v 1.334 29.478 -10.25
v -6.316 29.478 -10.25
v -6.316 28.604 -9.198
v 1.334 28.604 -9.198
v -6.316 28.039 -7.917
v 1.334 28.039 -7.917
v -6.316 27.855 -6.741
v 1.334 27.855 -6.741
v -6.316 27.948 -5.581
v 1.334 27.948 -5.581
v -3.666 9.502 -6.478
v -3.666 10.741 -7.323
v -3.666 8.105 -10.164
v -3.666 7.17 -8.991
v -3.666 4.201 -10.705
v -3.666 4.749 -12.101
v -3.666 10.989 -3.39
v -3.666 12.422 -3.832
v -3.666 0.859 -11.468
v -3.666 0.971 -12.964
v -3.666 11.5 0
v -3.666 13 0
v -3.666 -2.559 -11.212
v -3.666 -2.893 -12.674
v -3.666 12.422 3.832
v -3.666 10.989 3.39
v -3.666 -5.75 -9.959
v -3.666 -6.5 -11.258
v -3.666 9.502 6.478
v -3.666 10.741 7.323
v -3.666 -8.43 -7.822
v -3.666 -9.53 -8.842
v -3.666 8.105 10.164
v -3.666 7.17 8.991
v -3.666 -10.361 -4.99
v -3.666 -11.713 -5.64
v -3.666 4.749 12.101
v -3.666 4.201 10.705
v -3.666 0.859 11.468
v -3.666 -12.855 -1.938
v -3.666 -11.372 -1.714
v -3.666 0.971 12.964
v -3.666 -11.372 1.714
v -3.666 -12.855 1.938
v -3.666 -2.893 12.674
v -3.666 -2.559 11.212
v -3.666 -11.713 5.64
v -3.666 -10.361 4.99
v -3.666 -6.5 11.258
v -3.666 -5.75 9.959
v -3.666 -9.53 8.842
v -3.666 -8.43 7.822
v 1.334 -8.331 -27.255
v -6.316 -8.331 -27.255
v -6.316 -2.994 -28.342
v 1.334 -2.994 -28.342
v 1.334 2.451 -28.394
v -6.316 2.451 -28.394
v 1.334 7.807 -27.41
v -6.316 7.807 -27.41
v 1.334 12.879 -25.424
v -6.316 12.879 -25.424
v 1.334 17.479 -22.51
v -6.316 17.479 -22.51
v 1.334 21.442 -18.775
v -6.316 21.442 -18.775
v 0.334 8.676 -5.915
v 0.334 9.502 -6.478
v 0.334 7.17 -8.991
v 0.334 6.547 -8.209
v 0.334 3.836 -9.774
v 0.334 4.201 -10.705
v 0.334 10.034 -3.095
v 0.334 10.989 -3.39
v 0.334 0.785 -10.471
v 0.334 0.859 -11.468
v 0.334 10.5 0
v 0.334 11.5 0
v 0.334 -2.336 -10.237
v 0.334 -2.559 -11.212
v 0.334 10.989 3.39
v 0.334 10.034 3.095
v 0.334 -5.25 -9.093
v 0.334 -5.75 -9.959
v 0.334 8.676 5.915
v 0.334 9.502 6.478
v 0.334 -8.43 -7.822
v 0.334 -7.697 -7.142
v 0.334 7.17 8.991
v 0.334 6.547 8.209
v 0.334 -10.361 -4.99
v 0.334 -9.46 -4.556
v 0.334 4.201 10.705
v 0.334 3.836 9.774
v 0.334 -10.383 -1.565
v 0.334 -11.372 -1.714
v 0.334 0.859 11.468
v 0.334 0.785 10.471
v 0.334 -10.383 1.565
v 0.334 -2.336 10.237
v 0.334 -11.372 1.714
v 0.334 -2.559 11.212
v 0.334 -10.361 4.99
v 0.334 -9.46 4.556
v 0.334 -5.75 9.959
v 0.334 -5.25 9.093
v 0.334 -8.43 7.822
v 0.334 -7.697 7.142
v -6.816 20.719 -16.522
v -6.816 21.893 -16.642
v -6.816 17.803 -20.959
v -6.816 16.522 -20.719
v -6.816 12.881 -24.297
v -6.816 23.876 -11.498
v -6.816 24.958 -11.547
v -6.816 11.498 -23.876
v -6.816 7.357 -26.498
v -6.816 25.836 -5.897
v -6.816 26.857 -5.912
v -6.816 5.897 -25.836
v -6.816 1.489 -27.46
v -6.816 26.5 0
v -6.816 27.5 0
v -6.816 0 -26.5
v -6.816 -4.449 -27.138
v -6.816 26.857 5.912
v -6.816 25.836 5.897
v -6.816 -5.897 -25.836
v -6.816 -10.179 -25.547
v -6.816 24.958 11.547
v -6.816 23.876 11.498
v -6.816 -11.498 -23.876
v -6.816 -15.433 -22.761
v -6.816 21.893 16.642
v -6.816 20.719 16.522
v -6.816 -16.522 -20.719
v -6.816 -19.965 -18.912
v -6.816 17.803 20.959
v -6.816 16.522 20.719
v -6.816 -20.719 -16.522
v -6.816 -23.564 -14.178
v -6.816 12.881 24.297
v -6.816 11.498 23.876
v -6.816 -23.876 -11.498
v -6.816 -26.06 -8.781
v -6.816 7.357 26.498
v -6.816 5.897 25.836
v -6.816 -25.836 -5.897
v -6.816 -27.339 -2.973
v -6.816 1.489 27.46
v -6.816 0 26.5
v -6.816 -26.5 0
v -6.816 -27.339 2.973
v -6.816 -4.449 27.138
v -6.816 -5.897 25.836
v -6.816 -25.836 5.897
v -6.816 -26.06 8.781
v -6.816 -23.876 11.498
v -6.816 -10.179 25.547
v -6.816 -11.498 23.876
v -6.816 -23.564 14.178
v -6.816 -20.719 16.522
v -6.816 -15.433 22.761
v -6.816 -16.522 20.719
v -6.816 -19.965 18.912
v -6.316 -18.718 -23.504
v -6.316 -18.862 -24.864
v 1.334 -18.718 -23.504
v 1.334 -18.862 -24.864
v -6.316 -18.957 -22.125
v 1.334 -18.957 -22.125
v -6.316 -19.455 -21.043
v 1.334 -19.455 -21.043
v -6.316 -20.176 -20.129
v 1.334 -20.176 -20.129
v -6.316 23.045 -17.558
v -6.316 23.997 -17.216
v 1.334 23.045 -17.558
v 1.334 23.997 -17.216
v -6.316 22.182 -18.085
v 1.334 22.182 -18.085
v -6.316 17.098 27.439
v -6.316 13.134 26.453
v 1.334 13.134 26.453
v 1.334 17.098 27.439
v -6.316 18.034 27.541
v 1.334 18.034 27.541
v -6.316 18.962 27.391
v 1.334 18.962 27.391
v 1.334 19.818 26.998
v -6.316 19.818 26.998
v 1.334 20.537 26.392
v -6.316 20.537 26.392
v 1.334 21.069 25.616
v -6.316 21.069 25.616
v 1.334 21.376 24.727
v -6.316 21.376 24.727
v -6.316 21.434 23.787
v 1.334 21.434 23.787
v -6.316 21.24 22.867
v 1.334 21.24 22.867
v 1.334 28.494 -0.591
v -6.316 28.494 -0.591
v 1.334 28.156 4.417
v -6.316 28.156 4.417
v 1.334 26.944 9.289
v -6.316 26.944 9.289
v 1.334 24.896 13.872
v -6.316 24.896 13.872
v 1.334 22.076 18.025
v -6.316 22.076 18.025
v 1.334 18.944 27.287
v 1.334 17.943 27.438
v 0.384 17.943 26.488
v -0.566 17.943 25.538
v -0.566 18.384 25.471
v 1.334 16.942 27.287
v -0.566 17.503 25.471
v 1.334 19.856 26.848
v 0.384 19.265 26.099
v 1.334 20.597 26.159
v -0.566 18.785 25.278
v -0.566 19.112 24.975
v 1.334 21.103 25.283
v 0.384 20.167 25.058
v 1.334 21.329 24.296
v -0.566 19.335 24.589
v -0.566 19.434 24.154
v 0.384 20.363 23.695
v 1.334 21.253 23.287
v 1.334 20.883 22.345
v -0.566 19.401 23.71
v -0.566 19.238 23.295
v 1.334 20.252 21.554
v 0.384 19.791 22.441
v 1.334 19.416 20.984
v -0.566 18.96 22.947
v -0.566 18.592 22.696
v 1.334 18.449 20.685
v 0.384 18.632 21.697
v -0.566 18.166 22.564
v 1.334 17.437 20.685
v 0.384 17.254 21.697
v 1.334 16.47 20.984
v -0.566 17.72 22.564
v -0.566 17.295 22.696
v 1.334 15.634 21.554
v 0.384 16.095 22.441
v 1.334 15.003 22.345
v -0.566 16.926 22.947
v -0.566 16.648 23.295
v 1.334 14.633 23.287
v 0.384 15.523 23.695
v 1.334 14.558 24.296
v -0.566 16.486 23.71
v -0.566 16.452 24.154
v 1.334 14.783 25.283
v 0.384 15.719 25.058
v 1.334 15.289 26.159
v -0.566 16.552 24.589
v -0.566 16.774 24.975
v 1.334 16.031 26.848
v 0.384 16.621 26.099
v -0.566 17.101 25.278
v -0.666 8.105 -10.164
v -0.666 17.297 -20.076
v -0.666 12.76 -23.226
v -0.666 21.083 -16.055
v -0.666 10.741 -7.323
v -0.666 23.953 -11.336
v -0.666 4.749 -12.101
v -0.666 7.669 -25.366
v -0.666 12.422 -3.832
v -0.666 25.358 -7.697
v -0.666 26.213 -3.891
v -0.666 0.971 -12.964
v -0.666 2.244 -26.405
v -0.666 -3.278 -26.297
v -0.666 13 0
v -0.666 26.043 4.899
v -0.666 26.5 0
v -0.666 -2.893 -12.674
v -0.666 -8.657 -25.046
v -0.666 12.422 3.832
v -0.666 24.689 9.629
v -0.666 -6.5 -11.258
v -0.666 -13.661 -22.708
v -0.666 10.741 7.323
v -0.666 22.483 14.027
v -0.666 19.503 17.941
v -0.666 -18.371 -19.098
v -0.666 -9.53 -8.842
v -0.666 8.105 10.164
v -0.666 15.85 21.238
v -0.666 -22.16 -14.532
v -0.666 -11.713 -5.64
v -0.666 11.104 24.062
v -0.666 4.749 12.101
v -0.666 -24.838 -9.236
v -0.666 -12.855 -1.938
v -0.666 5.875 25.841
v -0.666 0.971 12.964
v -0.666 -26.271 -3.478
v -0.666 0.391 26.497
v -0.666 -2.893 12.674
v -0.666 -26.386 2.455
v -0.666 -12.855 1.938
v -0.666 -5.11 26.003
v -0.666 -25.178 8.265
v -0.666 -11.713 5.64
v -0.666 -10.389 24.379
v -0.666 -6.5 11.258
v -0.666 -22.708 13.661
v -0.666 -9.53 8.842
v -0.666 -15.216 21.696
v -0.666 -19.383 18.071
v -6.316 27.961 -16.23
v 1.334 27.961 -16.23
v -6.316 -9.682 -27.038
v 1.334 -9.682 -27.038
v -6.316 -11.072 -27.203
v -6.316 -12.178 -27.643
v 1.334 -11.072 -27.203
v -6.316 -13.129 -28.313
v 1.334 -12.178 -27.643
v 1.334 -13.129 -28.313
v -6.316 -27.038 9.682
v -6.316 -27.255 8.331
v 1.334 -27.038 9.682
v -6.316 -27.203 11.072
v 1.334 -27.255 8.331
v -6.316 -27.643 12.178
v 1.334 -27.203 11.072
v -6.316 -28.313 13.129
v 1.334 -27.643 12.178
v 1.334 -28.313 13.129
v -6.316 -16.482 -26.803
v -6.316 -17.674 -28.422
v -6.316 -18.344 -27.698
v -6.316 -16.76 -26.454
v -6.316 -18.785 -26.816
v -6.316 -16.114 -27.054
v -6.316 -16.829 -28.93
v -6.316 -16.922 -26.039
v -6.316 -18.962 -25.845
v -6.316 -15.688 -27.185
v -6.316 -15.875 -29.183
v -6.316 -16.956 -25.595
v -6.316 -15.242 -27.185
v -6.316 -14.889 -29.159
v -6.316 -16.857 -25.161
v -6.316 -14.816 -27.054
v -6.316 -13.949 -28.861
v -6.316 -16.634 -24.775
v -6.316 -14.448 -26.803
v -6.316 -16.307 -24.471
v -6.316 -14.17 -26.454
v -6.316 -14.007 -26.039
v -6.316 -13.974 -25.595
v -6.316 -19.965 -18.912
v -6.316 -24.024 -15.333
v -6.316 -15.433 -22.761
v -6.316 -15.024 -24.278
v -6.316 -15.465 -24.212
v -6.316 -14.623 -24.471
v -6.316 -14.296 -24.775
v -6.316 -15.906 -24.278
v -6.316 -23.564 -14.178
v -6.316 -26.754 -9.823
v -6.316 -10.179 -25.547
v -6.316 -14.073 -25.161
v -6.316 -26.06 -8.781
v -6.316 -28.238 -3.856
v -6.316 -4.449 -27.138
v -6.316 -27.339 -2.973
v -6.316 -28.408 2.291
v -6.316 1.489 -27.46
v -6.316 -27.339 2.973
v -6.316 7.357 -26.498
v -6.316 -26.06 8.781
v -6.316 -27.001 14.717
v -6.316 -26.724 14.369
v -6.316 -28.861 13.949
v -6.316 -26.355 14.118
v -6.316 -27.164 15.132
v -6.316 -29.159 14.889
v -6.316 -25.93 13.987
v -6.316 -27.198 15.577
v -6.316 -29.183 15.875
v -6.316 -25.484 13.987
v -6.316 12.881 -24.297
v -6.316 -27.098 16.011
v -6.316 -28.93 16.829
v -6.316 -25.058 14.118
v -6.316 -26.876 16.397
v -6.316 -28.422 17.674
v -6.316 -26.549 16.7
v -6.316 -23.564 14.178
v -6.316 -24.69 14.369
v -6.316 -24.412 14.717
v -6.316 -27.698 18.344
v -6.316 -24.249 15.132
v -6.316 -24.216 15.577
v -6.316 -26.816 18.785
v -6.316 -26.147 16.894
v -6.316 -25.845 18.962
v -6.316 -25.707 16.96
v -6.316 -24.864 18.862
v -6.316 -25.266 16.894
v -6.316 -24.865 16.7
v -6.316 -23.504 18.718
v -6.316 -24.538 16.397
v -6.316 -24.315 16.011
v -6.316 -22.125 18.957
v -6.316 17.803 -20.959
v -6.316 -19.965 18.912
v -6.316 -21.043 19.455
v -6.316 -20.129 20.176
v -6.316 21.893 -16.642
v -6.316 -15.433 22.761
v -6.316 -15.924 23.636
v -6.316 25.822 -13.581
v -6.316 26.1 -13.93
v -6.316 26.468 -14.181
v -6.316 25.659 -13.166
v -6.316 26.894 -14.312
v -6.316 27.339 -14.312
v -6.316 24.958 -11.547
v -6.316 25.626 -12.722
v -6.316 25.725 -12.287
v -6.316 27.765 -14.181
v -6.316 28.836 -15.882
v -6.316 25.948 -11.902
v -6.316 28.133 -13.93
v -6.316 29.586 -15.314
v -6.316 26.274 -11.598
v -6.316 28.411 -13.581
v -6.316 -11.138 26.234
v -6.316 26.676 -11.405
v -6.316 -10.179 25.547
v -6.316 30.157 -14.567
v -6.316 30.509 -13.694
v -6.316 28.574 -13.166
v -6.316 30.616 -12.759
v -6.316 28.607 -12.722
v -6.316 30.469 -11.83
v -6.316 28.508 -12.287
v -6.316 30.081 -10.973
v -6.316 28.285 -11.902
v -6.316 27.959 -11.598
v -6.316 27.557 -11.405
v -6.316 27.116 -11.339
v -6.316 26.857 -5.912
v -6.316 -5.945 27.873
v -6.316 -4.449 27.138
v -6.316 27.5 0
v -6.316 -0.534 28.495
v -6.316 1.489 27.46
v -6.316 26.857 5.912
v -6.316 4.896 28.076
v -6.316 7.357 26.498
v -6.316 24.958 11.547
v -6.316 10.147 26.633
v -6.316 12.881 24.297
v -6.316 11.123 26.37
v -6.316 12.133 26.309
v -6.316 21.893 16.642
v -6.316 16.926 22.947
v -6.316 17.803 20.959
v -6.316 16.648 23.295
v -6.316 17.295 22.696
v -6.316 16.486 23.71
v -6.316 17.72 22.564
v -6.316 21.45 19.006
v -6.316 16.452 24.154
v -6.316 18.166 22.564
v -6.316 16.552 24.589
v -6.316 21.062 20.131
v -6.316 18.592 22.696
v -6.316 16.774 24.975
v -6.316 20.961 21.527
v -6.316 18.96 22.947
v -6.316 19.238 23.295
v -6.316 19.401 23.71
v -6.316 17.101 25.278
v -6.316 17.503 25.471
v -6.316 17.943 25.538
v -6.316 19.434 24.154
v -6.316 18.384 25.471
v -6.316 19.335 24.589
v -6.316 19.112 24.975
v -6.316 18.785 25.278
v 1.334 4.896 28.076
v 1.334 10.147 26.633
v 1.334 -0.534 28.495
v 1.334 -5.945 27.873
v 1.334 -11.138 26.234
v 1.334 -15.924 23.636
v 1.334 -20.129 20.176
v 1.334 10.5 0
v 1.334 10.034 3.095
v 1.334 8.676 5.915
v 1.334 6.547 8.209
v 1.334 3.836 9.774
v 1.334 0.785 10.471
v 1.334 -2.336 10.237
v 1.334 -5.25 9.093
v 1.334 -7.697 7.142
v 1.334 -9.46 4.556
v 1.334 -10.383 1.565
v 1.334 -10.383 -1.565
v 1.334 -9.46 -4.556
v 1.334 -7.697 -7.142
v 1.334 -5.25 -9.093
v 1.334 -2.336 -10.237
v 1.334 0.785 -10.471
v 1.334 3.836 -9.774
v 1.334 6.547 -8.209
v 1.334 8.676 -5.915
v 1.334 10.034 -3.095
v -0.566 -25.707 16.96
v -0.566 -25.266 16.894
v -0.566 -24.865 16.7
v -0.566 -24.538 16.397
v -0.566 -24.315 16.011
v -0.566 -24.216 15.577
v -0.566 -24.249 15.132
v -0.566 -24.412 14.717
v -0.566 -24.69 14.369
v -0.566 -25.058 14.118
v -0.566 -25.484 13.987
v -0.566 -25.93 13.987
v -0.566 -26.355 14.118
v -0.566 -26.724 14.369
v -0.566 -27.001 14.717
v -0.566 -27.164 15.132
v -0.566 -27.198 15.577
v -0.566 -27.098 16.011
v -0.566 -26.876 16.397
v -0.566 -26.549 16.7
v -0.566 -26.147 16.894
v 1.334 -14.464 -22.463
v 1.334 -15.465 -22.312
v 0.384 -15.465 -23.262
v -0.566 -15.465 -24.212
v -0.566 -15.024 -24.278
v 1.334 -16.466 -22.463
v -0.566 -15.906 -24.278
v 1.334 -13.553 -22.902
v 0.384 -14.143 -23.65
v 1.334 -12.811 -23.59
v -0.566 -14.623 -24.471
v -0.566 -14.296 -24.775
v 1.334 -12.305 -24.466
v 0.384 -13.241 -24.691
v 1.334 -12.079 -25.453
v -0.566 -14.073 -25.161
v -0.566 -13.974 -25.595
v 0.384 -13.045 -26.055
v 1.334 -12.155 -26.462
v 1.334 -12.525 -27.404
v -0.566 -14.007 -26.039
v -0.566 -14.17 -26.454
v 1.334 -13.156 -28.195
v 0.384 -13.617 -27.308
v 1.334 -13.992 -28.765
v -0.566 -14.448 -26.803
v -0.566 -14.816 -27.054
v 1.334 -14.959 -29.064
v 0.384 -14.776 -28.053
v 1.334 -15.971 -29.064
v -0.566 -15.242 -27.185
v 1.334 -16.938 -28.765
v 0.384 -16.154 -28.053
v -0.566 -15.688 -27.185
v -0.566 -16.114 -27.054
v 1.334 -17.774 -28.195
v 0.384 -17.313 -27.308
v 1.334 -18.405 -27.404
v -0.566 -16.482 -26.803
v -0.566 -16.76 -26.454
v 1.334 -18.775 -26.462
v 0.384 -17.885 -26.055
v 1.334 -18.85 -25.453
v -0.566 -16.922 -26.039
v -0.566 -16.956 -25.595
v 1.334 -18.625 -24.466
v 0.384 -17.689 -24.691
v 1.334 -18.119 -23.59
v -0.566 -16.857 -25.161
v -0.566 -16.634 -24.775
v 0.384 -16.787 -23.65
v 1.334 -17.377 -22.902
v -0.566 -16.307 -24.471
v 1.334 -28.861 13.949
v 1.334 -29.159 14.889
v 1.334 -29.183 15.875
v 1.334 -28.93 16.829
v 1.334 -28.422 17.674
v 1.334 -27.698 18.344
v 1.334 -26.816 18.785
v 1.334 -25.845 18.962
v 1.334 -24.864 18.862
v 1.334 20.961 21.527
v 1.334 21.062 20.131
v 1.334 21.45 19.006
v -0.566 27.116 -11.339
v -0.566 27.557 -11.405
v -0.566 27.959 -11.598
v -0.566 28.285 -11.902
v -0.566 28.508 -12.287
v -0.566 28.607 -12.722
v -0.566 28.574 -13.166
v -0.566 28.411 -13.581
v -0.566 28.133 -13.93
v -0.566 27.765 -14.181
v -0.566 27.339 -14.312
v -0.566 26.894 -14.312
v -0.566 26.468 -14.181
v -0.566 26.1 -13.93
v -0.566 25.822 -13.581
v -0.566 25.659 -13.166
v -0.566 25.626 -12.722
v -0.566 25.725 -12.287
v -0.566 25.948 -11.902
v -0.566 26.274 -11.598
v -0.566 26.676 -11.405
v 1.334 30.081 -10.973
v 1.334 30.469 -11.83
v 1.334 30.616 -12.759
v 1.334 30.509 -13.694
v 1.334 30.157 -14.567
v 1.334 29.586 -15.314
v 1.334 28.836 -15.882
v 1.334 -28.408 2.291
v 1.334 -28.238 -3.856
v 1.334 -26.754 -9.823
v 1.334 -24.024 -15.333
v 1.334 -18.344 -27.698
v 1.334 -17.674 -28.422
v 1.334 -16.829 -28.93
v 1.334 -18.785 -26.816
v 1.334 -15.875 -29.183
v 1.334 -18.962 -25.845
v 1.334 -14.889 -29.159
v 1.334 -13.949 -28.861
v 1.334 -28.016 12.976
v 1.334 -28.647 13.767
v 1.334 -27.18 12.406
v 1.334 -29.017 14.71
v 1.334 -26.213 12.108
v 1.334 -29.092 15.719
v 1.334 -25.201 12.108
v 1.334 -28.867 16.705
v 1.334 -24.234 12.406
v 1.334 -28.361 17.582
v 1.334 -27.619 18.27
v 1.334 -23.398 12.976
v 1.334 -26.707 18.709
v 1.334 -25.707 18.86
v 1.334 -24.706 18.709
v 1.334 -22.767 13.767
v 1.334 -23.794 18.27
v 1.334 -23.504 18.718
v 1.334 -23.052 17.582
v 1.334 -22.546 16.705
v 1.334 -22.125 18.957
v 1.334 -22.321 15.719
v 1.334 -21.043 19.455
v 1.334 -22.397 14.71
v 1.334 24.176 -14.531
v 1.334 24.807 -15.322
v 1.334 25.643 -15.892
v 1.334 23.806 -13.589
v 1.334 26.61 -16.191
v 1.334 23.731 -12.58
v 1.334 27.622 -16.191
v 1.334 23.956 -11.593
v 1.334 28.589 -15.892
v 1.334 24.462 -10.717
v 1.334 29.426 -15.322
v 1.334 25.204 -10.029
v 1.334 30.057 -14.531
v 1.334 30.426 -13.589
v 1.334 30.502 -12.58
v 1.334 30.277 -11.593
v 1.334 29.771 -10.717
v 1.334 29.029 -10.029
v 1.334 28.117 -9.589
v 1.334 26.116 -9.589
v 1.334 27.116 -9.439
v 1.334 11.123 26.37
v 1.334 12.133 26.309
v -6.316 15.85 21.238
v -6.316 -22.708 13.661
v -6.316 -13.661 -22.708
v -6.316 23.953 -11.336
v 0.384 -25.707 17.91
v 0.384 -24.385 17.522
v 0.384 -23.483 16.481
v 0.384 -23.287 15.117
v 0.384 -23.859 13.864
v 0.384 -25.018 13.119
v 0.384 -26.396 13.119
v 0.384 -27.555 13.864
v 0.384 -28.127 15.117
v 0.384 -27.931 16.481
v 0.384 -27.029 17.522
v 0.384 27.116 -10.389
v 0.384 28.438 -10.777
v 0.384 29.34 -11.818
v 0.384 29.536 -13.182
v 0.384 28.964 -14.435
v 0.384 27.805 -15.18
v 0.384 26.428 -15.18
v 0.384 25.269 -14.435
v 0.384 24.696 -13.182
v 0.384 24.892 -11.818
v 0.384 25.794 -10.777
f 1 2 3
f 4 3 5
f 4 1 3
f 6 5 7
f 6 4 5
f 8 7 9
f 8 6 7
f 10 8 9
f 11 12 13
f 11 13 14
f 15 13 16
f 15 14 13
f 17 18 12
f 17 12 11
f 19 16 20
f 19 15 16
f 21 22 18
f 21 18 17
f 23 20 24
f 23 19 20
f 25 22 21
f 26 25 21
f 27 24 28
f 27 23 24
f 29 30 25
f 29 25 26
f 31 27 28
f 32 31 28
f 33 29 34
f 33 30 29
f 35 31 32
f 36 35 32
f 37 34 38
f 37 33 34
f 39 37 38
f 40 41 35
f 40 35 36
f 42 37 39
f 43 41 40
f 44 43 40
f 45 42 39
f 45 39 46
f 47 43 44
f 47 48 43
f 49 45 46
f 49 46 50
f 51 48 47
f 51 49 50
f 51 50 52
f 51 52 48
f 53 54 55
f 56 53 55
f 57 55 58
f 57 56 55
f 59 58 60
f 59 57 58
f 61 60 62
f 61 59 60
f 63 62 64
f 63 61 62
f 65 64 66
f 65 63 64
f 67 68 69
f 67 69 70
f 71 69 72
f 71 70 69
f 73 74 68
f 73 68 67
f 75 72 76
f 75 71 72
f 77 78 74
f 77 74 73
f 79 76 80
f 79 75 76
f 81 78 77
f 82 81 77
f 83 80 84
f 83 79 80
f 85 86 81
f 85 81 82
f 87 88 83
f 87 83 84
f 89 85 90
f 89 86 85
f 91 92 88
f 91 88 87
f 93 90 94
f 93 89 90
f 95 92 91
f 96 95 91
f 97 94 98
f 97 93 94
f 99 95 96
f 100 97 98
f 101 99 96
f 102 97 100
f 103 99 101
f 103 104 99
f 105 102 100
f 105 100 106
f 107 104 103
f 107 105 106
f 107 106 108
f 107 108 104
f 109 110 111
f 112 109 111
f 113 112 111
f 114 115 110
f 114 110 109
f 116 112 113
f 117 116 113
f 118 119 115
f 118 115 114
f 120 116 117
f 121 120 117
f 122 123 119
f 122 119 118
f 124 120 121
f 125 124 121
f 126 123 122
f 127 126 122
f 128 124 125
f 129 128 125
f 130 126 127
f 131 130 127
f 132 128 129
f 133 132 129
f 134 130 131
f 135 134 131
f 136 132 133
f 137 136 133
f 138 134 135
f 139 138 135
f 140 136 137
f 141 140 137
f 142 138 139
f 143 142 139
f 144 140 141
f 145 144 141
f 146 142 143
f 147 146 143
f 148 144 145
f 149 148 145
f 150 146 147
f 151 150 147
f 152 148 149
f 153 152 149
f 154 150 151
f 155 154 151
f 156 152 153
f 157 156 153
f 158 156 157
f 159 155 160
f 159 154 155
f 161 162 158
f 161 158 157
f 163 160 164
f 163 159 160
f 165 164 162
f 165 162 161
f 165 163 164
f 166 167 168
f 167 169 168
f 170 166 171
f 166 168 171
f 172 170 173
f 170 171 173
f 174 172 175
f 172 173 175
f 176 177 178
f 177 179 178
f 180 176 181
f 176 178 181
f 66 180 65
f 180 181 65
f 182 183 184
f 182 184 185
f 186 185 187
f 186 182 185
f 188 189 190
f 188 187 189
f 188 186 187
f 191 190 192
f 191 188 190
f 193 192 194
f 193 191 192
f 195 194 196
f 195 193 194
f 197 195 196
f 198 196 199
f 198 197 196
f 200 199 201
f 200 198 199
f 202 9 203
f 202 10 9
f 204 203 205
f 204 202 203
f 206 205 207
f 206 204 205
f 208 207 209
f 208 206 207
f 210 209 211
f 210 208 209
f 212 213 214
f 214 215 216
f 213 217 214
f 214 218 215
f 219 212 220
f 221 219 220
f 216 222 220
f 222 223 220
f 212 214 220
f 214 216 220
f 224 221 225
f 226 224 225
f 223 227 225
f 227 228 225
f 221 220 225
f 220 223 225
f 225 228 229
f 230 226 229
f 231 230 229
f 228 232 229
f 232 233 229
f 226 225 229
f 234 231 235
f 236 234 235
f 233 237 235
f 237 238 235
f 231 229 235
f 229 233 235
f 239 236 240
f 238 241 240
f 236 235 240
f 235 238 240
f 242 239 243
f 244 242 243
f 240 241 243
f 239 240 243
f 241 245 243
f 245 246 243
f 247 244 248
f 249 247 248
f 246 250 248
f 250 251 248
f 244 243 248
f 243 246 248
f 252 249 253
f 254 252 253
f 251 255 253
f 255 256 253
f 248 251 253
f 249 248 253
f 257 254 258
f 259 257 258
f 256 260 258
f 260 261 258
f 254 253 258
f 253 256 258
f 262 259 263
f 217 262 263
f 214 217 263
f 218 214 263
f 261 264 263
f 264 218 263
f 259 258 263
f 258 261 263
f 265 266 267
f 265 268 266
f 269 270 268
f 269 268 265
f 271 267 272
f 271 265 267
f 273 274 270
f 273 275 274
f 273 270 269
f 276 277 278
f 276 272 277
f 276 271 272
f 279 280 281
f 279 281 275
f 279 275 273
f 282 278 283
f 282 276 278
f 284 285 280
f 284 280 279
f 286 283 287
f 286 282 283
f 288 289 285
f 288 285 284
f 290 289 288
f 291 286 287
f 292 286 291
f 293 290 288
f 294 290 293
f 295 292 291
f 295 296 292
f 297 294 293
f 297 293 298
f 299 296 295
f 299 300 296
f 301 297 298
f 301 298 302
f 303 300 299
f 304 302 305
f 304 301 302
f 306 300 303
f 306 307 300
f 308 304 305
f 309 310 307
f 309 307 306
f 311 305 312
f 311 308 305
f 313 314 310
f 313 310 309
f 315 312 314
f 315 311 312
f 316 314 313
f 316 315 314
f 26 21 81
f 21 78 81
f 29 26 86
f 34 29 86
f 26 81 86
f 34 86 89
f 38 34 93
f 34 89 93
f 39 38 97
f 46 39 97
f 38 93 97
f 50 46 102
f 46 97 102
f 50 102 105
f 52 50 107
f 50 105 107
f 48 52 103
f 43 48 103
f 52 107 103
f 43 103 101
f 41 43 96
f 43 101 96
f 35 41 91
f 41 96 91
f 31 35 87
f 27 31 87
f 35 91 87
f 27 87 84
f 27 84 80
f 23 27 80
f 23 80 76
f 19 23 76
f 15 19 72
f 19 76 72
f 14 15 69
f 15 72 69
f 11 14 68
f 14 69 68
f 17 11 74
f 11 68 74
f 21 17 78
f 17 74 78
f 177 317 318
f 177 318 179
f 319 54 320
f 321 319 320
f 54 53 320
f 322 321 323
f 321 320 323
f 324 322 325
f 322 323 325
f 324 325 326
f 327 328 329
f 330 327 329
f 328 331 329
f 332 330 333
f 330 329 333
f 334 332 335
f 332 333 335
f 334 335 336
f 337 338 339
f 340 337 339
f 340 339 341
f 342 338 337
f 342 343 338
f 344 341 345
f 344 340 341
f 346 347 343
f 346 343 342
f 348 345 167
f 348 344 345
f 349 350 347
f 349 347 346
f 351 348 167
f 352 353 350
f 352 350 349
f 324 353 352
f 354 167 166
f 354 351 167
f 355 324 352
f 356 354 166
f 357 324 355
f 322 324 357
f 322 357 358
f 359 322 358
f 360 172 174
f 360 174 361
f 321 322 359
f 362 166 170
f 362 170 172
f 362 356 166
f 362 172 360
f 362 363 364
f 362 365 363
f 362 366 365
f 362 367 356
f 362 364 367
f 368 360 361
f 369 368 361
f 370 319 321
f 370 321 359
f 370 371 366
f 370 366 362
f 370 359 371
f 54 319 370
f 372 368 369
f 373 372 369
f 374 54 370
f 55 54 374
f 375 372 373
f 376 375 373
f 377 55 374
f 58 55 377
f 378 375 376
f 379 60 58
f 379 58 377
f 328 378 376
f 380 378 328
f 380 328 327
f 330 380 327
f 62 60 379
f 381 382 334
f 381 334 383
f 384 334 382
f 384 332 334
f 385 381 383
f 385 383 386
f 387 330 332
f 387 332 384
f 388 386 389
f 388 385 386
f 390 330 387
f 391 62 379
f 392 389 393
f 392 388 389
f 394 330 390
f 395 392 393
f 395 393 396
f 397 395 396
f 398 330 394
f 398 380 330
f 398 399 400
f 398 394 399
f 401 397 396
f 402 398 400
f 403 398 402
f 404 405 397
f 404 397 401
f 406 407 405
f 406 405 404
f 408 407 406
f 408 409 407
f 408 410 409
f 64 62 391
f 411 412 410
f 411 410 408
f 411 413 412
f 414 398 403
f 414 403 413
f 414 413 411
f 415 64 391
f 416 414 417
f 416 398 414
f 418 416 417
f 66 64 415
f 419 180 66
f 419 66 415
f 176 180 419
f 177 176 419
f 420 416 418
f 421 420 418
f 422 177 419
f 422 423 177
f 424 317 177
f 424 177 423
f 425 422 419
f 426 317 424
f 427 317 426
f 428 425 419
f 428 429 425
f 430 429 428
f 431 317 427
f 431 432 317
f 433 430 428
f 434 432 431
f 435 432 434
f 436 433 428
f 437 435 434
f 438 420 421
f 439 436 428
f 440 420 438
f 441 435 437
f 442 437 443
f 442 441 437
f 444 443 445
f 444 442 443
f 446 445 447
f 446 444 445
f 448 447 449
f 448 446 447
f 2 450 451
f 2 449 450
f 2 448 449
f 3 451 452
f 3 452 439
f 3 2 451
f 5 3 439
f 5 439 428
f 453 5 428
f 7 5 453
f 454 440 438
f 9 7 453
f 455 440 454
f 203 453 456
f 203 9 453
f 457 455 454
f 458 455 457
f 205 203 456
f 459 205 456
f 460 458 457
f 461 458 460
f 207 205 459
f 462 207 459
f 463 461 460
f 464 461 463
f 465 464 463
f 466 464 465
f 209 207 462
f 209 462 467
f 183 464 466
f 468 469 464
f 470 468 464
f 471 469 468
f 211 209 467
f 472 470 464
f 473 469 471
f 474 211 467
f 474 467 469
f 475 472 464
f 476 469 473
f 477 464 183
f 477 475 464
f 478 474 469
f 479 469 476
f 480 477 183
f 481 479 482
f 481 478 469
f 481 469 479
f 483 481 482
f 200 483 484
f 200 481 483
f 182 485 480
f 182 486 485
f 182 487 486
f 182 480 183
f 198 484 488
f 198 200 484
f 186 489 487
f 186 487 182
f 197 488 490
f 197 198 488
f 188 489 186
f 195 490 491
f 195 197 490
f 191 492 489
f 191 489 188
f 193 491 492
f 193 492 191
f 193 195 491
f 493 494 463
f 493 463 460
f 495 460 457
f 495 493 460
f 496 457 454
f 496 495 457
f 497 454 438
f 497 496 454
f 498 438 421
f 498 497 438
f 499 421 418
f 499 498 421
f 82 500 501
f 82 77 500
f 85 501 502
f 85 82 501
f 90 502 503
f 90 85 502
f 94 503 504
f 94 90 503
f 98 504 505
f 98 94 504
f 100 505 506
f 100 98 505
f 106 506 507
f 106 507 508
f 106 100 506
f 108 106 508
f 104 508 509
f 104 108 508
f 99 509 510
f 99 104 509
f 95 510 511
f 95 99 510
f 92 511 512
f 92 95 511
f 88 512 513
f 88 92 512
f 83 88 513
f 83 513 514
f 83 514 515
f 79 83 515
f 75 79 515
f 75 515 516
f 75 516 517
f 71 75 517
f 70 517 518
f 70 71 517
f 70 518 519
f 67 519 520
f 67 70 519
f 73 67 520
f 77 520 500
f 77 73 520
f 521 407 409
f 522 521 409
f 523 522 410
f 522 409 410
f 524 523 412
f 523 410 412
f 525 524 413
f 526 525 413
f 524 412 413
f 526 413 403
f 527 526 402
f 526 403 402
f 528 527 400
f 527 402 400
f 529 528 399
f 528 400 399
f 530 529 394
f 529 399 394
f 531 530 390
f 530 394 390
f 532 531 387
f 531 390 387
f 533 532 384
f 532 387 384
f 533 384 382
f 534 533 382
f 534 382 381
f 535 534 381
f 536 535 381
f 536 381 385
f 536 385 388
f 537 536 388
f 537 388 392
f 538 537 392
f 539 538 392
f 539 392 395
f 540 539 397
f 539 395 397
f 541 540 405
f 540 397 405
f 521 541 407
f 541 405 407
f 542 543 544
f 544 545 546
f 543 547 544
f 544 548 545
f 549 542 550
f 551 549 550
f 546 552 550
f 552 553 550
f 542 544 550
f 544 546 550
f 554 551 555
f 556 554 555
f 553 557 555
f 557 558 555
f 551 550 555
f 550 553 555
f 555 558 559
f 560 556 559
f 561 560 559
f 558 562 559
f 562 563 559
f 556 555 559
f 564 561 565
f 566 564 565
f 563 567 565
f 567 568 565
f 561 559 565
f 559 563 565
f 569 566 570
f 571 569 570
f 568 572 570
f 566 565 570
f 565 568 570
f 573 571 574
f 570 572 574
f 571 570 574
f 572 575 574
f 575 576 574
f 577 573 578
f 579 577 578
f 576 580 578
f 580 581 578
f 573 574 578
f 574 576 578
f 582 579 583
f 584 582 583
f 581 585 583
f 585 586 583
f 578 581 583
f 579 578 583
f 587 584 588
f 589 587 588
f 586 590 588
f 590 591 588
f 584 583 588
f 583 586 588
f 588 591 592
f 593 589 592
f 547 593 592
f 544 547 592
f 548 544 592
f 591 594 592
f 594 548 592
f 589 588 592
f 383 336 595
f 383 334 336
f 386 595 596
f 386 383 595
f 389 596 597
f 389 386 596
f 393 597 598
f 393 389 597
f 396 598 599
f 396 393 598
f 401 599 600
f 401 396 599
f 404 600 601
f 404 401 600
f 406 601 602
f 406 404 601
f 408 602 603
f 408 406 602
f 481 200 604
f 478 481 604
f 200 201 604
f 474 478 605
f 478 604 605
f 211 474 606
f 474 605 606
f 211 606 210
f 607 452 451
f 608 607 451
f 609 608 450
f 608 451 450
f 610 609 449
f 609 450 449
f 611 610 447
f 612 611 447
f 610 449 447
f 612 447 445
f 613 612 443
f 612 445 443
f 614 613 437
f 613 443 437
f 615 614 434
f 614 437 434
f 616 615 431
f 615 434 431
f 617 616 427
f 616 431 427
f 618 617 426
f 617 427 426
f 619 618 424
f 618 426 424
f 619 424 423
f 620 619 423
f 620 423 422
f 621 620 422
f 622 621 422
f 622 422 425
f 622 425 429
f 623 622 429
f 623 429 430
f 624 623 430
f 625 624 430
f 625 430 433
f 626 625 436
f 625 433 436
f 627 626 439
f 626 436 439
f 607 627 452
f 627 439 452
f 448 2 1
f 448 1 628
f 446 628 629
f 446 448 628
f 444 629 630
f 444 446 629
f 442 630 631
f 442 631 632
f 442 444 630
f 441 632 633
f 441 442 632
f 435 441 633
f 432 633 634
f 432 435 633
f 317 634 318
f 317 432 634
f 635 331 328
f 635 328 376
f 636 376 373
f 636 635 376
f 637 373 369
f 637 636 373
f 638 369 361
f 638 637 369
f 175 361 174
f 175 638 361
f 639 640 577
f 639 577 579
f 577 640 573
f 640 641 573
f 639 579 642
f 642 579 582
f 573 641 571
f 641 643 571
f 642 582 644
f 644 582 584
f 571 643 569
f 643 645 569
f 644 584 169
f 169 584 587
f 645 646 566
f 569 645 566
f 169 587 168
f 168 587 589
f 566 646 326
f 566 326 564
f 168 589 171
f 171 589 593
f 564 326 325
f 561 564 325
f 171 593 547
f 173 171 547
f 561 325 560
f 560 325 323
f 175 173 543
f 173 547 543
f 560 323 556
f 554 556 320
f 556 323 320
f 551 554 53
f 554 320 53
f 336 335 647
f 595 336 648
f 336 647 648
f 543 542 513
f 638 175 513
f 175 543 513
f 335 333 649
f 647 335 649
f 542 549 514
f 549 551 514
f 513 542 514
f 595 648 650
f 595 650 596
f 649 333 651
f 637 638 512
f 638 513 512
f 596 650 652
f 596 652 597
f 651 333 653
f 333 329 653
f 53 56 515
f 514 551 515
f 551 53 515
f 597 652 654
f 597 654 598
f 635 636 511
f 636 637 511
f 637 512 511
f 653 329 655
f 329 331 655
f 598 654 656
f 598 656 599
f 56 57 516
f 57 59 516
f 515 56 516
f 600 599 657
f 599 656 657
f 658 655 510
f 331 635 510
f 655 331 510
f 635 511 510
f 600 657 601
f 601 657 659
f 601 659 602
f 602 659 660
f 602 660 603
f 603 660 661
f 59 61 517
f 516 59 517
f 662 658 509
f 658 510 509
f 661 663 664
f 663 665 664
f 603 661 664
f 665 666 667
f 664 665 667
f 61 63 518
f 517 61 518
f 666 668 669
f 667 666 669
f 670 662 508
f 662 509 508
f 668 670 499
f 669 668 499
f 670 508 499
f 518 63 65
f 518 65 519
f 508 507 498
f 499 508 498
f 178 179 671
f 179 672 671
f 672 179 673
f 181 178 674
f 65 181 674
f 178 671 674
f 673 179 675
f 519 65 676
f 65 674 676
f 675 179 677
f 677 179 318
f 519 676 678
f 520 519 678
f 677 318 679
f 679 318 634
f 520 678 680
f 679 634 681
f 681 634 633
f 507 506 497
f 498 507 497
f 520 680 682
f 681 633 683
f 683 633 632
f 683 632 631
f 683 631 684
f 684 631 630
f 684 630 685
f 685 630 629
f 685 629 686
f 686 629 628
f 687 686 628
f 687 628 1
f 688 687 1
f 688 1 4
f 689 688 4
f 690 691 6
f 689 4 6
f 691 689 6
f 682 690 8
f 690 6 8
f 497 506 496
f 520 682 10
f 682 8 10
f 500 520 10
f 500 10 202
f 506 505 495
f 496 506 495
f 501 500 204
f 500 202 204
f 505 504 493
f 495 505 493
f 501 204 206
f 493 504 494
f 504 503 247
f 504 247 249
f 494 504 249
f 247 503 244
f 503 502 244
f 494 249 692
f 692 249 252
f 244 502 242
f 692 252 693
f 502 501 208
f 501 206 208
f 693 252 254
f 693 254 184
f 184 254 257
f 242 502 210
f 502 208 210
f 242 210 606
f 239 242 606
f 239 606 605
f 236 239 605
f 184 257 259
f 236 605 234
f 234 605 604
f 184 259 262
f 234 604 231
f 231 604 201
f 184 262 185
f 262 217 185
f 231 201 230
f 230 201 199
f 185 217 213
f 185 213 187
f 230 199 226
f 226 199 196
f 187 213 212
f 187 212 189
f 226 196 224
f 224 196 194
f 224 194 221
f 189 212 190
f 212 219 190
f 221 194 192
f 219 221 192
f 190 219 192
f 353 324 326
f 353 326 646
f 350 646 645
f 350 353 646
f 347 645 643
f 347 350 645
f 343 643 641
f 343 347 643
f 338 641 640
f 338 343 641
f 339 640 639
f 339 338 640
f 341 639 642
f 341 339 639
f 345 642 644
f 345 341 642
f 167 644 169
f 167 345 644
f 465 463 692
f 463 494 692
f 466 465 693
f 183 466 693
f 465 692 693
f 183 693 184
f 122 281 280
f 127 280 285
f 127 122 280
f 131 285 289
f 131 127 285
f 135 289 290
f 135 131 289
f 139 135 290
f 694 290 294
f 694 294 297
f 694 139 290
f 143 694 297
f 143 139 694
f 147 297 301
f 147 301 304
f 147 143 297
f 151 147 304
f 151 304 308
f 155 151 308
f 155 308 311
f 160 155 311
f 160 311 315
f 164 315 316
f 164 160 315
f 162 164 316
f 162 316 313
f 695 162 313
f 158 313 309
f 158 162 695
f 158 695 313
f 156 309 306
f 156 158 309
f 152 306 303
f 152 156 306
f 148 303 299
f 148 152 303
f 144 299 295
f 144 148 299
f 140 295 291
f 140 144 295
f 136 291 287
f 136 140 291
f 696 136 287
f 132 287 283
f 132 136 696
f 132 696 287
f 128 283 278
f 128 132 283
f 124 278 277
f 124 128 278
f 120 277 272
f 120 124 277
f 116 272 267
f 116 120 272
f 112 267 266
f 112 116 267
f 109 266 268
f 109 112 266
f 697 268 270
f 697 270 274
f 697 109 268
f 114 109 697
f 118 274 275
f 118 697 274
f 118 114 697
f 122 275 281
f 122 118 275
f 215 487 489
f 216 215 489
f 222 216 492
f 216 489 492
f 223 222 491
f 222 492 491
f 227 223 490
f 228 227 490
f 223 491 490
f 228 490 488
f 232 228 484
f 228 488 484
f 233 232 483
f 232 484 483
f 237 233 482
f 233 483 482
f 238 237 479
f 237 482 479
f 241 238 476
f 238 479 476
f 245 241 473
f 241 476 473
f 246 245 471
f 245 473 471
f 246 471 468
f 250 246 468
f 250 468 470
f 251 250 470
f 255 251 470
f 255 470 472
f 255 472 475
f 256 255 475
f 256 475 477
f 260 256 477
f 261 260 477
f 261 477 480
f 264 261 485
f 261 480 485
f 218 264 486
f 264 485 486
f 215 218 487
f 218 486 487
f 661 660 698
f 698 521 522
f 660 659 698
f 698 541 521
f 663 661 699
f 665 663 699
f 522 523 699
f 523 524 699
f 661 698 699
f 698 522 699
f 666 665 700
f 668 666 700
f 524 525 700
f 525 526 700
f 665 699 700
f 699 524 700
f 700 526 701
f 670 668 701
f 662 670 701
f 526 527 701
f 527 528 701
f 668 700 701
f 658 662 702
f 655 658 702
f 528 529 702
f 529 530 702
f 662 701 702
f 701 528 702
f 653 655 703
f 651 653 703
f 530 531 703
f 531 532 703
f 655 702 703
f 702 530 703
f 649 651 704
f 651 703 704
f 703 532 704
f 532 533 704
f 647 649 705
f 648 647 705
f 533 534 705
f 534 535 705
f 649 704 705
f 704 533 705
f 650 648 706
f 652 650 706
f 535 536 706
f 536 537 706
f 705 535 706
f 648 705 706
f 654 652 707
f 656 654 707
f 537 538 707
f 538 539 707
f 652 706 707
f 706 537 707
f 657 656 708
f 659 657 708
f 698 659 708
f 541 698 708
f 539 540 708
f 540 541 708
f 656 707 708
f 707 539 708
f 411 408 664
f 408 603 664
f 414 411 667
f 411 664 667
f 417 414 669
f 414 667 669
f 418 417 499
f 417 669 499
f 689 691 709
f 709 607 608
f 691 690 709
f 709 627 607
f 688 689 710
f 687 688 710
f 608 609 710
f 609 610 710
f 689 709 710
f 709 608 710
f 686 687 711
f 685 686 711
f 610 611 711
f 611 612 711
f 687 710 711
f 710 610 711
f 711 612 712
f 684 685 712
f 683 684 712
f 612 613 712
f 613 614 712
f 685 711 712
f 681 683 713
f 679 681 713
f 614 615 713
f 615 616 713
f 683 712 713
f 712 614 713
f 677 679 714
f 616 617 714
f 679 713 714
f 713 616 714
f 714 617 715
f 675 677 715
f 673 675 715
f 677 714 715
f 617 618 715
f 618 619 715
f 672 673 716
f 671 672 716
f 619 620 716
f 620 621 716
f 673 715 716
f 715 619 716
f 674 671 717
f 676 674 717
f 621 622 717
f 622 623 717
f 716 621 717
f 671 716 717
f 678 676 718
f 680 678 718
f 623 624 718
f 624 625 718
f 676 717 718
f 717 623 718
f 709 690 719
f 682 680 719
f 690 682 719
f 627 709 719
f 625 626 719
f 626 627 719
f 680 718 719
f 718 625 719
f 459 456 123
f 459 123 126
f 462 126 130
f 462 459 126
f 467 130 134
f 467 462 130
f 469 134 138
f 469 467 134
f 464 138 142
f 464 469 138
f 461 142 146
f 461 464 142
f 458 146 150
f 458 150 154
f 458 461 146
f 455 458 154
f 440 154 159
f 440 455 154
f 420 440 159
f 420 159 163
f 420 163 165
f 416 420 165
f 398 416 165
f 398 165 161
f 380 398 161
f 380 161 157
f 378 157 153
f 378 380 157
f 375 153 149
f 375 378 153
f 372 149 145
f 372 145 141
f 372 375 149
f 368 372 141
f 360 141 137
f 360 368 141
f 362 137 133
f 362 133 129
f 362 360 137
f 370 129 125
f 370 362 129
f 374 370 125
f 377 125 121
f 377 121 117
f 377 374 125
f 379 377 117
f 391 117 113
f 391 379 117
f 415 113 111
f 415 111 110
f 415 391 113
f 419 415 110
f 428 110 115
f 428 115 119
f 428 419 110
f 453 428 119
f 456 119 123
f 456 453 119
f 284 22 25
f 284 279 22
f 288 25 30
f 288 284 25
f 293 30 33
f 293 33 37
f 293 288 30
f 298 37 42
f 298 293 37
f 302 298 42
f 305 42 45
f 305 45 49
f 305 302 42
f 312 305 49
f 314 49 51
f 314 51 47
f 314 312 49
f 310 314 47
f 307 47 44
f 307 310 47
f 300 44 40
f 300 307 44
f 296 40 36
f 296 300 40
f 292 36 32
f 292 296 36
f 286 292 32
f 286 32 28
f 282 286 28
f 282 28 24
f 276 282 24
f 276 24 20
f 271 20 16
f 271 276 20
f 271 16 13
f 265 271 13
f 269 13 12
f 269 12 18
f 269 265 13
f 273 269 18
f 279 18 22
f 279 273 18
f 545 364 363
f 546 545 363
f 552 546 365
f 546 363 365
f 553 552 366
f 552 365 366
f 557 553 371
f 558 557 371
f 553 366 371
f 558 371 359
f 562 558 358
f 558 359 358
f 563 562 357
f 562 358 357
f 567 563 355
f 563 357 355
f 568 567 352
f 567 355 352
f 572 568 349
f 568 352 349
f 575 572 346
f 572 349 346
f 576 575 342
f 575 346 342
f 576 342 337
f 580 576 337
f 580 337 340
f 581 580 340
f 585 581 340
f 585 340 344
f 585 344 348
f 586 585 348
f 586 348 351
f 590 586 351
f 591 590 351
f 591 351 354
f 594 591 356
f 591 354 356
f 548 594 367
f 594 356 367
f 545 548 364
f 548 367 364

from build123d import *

# Parameters (mm, degrees)
SKETCH1_W           = 3
SKETCH1_H           = 1.5
SKETCH2_R           = 3.5
SKETCH2_R_2         = 1.495
BOSS_EXTRUDE1_DEPTH = 7.65
FILLET1_R           = 5
CHAMFER1_SIZE       = 1.9
BOSS_EXTRUDE2_DEPTH = 7.65
FILLET2_R           = 5


with BuildPart() as part:
    # Sketch1 → Revolve1 (revolve)
    with BuildSketch(Plane.XY):
        Polygon((-6.31640625, 27.5), (-6.31640625, 28.5), (1.33359375, 28.5), (1.33359375, 10.5), (0.33359375, 10.5), (0.33359375, 11.5), (-0.66640625, 11.5), (-0.66640625, 26.5), (-6.81640625, 26.5), (-6.81640625, 27.5), align=None)
        with Locations((-2.16640625, 12.25)):
            Rectangle(SKETCH1_W, SKETCH1_H)
    revolve(axis=Axis((0, 0, 0), (1, 0, 0)))

    # Sketch2 → Boss-Extrude1 (add)
    with BuildSketch(Plane.ZY.offset(6.31640625)):
        with Locations((-12.833666233, 27.116360579)):
            Circle(SKETCH2_R)
        with Locations((-12.833666233, 27.116360579)):
            Circle(SKETCH2_R_2, mode=Mode.SUBTRACT)
        with Locations((24.042513933, 17.943174852)):
            Circle(SKETCH2_R)
        with Locations((24.042513933, 17.943174852)):
            Circle(SKETCH2_R_2, mode=Mode.SUBTRACT)
        with Locations((15.464980443, -25.706699125)):
            Circle(SKETCH2_R)
        with Locations((15.464980443, -25.706699125)):
            Circle(SKETCH2_R_2, mode=Mode.SUBTRACT)
        with Locations((-25.706699125, -15.464980443)):
            Circle(SKETCH2_R)
        with Locations((-25.706699125, -15.464980443)):
            Circle(SKETCH2_R_2, mode=Mode.SUBTRACT)
    extrude(amount=-BOSS_EXTRUDE1_DEPTH)

    # Fillet1
    fillet1_edges = [part.edges().sort_by_distance(p)[0] for p in [
        (-2.49140625, 26.926500874, -9.338819556),
        (-2.49140625, 19.412851347, 20.866029871),
        (-2.49140625, -17.243063028, -22.691998092),
        (-2.49140625, -11.968566697, -25.865100255),
        (-2.49140625, -22.691998092, 17.243063028),
        (-2.49140625, -25.865100255, 11.968566697),
    ]]
    fillet(fillet1_edges, radius=FILLET1_R)

    # Chamfer1
    chamfer1_edges = [part.edges().sort_by_distance(p)[0] for p in [
        (1.33359375, 27.116360579, -14.328666233),
        (1.33359375, 17.943174852, 22.547513933),
        (1.33359375, -15.464980443, -27.201699125),
        (1.33359375, -25.706699125, 13.969980443),
    ]]
    chamfer(chamfer1_edges, length=CHAMFER1_SIZE)

    # Sketch4 → Boss-Extrude2 (add)
    with BuildSketch(Plane.ZY.offset(6.31640625)):
        with BuildLine():
            ThreePointArc((-14.902549995, 24.29329133), (-16.124726175, 25.925174422), (-16.230156511, 27.961259264))
            Line((-16.230156511, 27.961259264), (-17.61181157, 22.407009913))
            ThreePointArc((-17.61181157, 22.407009913), (-16.284515387, 23.38941125), (-14.902549995, 24.29329133))
        make_face()
        with BuildLine():
            Line((26.057349153, 11.544026816), (27.439004212, 17.098276167))
            ThreePointArc((27.439004212, 17.098276167), (26.391913334, 15.34888835), (24.547607559, 14.479812262))
            ThreePointArc((24.547607559, 14.479812262), (25.345021602, 13.033797605), (26.057349153, 11.544026816))
        make_face()
    extrude(amount=-BOSS_EXTRUDE2_DEPTH)

    # Fillet2
    fillet2_edges = [part.edges().sort_by_distance(p)[0] for p in [
        (-2.49140625, 22.407009913, -17.61181157),
        (-2.49140625, 11.544026816, 26.057349153),
    ]]
    fillet(fillet2_edges, radius=FILLET2_R)


solid = part.part
